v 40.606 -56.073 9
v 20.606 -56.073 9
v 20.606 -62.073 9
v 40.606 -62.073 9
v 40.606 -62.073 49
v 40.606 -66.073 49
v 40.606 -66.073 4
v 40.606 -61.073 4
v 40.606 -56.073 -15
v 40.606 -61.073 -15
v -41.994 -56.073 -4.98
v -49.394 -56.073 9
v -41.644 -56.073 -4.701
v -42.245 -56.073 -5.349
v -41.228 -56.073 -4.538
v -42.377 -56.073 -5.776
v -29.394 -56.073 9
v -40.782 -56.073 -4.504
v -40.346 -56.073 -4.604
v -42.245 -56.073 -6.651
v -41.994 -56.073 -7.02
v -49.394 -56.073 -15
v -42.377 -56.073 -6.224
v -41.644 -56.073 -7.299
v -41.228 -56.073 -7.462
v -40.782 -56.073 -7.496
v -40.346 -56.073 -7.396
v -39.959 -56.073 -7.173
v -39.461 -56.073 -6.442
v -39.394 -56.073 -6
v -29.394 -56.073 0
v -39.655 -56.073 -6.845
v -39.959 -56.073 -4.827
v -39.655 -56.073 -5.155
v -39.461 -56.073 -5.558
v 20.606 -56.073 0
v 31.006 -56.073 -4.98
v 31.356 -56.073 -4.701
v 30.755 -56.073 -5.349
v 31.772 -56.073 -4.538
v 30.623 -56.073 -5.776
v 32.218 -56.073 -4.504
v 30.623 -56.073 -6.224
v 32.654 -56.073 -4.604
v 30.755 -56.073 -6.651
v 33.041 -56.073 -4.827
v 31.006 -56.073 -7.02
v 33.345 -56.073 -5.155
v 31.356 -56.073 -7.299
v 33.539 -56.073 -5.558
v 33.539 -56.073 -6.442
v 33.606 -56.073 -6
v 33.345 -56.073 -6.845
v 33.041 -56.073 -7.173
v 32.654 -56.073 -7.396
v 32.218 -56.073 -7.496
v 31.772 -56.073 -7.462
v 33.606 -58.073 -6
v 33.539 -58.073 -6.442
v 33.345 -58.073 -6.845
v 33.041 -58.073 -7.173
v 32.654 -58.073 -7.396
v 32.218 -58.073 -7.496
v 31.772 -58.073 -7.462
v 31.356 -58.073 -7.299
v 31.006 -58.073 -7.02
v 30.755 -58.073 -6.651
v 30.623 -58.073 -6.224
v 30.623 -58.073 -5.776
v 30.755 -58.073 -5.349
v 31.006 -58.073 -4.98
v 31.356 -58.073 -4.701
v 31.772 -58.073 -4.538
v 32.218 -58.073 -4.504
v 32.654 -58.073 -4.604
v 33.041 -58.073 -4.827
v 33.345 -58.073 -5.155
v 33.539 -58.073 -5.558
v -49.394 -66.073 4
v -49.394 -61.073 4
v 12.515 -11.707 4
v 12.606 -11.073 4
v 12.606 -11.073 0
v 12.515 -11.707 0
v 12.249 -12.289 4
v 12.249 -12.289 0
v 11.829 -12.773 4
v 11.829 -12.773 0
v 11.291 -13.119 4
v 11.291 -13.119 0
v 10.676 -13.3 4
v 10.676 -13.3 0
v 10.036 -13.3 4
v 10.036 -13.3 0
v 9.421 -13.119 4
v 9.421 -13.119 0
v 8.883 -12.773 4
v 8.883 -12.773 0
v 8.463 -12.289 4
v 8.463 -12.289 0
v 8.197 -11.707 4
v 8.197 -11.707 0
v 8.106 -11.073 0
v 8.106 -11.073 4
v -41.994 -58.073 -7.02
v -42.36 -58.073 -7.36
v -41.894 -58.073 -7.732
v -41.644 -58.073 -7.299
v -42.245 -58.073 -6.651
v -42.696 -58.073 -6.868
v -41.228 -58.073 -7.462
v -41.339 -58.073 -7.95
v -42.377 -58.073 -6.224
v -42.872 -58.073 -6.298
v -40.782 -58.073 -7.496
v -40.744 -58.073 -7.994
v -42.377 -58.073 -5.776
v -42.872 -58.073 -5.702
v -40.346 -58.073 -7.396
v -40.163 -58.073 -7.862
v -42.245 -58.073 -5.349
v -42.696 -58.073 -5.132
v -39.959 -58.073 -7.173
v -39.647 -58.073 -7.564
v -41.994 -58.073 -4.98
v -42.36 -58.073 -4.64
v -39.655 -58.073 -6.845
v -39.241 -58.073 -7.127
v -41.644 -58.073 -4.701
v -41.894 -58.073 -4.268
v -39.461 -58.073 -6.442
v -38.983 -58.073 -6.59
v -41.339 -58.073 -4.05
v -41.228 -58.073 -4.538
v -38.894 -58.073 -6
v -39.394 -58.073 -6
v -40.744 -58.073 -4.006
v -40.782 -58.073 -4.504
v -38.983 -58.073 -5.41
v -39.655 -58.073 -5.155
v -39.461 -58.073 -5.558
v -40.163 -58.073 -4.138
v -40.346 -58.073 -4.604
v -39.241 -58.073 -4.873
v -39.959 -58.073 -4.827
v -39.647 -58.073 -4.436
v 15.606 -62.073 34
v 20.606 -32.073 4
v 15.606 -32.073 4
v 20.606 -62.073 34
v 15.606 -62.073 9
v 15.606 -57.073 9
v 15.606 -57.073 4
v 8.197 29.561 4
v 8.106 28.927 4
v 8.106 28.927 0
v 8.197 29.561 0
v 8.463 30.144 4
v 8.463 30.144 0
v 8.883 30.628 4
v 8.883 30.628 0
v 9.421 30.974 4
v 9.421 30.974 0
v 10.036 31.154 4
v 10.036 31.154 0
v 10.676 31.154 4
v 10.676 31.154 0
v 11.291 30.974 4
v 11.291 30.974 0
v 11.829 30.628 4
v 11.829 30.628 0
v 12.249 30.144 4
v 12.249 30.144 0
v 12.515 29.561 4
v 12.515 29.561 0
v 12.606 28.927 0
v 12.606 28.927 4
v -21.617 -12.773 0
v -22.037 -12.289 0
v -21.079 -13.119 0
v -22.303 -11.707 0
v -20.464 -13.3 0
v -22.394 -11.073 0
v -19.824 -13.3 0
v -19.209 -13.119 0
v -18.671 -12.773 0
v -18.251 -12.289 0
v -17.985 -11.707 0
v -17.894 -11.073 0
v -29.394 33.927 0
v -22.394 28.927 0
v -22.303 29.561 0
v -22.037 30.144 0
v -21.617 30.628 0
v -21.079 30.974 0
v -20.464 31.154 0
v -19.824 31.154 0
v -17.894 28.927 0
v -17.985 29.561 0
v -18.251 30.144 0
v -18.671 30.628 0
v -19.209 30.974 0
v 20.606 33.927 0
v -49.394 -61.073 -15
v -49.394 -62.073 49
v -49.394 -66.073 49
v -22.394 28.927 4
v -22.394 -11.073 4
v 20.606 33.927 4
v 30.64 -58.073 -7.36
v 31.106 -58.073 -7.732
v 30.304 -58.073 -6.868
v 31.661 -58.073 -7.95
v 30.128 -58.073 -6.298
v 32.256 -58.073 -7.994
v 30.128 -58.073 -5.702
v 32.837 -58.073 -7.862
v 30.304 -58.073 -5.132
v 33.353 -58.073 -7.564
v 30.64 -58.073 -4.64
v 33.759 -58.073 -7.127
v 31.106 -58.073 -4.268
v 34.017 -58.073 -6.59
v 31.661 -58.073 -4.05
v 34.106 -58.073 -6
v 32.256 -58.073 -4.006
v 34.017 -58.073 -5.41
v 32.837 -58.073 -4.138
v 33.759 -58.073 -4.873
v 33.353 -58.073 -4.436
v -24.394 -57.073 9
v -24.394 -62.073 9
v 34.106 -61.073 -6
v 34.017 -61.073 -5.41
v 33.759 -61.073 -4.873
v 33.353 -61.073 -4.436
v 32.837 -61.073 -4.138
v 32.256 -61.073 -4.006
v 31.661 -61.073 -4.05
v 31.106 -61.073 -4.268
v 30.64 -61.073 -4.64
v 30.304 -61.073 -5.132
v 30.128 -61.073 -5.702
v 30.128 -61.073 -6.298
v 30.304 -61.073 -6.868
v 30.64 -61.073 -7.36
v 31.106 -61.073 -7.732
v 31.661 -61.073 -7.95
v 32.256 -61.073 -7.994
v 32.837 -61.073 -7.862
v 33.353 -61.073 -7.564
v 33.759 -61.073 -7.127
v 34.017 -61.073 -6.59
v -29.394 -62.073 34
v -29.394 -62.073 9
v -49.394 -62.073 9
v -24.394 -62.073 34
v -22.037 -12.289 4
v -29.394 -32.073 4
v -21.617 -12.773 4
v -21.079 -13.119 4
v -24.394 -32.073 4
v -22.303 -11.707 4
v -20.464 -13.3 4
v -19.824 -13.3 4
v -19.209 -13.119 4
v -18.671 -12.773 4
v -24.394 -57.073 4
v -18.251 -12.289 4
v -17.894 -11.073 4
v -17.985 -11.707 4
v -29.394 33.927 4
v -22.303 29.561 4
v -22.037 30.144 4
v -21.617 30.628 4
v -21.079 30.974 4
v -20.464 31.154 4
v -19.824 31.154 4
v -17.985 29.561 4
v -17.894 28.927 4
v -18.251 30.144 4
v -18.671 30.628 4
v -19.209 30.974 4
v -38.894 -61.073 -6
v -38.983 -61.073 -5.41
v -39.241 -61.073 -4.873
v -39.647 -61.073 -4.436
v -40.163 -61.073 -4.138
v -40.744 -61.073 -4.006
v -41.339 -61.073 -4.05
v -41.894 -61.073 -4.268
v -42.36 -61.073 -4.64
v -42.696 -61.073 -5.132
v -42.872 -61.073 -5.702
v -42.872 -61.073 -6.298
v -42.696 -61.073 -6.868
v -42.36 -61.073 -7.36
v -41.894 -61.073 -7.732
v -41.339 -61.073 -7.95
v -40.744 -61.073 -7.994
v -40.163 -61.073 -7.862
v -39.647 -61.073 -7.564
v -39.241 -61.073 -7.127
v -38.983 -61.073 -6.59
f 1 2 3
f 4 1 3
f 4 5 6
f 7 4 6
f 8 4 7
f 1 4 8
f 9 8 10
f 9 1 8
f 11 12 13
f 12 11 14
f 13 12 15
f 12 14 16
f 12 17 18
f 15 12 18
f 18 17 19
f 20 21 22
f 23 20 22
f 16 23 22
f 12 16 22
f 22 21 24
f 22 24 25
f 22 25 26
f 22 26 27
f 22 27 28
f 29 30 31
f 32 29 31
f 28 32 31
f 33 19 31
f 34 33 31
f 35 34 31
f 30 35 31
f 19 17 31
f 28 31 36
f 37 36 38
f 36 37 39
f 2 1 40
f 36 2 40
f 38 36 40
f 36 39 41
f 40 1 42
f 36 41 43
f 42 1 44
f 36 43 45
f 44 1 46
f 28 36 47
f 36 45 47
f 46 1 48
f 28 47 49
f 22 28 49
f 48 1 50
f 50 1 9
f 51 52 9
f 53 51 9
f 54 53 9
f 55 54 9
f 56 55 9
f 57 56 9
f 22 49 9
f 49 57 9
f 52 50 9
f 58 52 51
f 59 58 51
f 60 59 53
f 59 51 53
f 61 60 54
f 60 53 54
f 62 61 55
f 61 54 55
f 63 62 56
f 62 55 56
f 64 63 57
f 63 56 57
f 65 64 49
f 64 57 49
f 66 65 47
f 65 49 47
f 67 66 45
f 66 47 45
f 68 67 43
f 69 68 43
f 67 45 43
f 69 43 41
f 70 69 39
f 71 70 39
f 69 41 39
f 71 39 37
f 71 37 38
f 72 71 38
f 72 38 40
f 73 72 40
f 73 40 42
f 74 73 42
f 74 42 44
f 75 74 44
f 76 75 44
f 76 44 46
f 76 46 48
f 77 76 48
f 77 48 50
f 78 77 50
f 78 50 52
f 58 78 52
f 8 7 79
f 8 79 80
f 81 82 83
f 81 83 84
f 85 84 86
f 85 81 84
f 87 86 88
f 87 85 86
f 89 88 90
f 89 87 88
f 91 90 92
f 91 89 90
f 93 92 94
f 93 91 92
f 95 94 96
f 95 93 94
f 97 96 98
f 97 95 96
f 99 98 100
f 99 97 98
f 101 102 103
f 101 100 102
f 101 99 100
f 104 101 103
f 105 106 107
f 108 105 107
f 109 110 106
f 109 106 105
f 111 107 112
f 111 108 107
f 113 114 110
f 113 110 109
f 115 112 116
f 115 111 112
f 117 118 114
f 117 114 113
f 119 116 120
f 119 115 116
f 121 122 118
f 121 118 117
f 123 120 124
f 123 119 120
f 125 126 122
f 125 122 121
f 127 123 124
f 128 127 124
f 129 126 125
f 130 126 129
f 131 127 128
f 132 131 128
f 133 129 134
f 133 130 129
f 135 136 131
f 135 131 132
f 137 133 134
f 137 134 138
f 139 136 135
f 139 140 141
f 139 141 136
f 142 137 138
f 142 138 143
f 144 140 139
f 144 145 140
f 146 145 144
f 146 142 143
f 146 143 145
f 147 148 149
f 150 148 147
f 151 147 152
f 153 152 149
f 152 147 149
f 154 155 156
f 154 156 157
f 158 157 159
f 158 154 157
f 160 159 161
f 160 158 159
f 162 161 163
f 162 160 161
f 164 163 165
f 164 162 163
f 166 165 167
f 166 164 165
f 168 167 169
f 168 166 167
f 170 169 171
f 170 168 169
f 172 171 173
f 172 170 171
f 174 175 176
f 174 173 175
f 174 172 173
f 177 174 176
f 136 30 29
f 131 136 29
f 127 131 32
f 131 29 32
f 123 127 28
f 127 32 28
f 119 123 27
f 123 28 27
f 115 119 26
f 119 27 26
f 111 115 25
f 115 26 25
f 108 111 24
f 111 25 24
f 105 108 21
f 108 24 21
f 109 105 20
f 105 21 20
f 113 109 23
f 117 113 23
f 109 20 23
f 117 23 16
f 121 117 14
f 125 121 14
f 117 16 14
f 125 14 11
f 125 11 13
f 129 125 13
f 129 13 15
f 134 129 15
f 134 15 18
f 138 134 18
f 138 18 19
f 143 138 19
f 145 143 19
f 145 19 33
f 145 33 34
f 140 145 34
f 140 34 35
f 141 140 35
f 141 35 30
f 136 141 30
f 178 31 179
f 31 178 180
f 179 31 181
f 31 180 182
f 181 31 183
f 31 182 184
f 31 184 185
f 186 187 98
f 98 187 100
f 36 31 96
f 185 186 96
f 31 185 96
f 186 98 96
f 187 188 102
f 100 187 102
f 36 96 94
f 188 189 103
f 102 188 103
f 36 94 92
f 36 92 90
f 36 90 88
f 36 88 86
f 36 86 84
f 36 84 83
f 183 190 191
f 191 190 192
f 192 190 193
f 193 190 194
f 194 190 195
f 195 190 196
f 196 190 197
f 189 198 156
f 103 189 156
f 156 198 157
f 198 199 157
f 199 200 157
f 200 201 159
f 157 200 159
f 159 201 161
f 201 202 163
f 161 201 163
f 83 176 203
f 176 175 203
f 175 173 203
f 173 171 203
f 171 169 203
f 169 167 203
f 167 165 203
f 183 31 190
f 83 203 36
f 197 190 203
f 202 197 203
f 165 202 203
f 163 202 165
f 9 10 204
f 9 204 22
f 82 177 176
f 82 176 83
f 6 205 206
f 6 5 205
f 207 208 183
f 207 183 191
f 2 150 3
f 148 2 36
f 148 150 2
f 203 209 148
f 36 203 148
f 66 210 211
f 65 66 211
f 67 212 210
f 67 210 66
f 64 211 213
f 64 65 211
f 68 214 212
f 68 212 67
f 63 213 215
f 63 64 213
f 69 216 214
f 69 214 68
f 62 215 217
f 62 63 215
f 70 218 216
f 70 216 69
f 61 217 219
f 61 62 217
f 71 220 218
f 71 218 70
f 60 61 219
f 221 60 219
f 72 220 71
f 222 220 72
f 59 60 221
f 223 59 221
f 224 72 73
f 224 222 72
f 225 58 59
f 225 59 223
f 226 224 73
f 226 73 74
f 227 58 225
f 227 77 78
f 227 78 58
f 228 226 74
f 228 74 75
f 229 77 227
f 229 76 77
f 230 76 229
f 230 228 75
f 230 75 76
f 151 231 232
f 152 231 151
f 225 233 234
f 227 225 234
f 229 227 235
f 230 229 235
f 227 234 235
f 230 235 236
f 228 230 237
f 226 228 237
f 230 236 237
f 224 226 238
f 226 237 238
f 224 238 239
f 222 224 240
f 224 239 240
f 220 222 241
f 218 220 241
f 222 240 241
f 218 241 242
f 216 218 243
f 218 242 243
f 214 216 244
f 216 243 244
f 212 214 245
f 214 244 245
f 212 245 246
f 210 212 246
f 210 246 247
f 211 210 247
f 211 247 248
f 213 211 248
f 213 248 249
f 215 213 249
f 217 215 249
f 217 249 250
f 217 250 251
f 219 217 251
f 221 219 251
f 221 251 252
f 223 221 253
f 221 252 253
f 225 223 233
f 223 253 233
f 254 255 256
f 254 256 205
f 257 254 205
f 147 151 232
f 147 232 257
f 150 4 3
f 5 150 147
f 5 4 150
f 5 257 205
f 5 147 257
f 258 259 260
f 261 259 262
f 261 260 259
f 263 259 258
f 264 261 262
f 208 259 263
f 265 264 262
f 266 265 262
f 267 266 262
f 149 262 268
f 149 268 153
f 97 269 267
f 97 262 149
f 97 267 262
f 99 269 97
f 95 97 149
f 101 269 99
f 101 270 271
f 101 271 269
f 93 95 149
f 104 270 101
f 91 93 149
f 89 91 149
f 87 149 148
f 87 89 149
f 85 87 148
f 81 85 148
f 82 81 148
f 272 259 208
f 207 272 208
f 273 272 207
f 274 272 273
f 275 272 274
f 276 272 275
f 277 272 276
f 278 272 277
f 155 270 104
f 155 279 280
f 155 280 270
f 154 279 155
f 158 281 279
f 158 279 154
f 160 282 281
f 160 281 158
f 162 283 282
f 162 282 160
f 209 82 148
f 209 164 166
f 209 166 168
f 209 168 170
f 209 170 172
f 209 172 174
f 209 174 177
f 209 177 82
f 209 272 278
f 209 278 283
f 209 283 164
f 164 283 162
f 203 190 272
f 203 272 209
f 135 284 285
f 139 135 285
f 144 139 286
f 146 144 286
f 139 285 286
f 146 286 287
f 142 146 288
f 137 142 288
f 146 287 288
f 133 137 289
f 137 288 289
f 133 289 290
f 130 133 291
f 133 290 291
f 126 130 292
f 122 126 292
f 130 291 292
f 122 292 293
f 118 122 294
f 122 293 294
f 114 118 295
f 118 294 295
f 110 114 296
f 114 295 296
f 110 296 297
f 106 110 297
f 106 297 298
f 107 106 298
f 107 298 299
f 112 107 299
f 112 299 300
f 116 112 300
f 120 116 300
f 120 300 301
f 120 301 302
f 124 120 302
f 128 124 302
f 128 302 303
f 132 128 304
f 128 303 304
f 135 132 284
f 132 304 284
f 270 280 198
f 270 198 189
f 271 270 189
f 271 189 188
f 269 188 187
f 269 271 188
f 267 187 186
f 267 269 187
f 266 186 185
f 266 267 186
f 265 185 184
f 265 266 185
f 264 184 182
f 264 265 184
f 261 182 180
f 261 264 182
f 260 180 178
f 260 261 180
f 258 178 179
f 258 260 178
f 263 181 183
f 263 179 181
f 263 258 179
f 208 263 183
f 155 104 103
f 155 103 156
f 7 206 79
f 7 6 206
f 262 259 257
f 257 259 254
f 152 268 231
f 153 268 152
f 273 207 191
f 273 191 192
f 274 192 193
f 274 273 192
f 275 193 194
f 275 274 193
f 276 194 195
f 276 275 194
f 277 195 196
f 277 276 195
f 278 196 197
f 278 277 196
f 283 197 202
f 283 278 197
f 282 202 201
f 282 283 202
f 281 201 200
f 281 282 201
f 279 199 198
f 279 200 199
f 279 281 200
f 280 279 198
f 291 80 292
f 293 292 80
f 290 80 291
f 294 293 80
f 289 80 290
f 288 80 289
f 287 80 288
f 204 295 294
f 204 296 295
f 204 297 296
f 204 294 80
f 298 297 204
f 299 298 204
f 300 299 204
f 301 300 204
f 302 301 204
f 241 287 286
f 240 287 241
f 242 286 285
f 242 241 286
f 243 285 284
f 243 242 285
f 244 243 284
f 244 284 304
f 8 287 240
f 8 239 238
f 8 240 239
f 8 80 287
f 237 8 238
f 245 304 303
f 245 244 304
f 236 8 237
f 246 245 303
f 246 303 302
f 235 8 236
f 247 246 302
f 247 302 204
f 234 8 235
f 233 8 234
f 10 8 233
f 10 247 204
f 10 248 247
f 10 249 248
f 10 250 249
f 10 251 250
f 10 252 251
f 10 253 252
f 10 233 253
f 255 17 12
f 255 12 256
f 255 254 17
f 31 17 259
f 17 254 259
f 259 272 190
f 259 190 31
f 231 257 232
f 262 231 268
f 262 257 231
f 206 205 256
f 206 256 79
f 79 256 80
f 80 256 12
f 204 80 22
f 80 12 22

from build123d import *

# Parameters (mm, degrees)
ESQUISSE1_W             = 50
ESQUISSE1_H             = 95
BOSS_EXTRU_1_DEPTH      = 4
ESQUISSE2_W             = 50
ESQUISSE2_H             = 4
BOSS_EXTRU_2_DEPTH      = 5
ESQUISSE3_W             = 50
ESQUISSE3_H             = 5
BOSS_EXTRU_3_DEPTH      = 5
ESQUISSE4_W             = 50
ESQUISSE4_H             = 4
BOSS_EXTRU_4_DEPTH      = 40
ESQUISSE5_W             = 50
ESQUISSE5_H             = 5
BOSS_EXTRU_5_DEPTH      = 15
ENL_V_MAT_EXTRU_1_REACH = 21
BOSS_EXTRU_6_DEPTH      = 5
BOSS_EXTRU_7_DEPTH      = 5
BOSS_EXTRU_8_DEPTH      = 20
BOSS_EXTRU_9_DEPTH      = 20
ENL_V_MAT_EXTRU_2_REACH = 12
ESQUISSE12_R            = 1.5
ESQUISSE13_R            = 2
ENL_V_MAT_EXTRU_3_DEPTH = 3


with BuildPart() as part:
    # Esquisse1 → Boss.-Extru.1 (new body)
    with BuildSketch(Plane.XY):
        with Locations((-4.39396009, -13.572795505)):
            Rectangle(ESQUISSE1_W, ESQUISSE1_H)
    extrude(amount=BOSS_EXTRU_1_DEPTH)

    # Esquisse2 → Boss.-Extru.2 (add)
    with BuildSketch(Plane.XY.offset(4)):
        with Locations((-4.39396009, -59.072795505)):
            Rectangle(ESQUISSE2_W, ESQUISSE2_H)
    extrude(amount=BOSS_EXTRU_2_DEPTH)

    # Esquisse3 → Boss.-Extru.3 (add)
    with BuildSketch(Plane.XZ.offset(61.072795505)):
        with Locations((-4.39396009, 6.5)):
            Rectangle(ESQUISSE3_W, ESQUISSE3_H)
    extrude(amount=BOSS_EXTRU_3_DEPTH)

    # Esquisse4 → Boss.-Extru.4 (add)
    with BuildSketch(Plane.XY.offset(9)):
        with Locations((-4.39396009, -64.072795505)):
            Rectangle(ESQUISSE4_W, ESQUISSE4_H)
    extrude(amount=BOSS_EXTRU_4_DEPTH)

    # Esquisse5 → Boss.-Extru.5 (add)
    with BuildSketch(Plane(origin=(0, 0, 0), x_dir=(-1, 0, 0), z_dir=(0, 0, -1))):
        with Locations((4.39396009, -58.572795505)):
            Rectangle(ESQUISSE5_W, ESQUISSE5_H)
    extrude(amount=BOSS_EXTRU_5_DEPTH)

    # Esquisse6 → Enlèv. mat.-Extru.1 (cut, up to next)
    with BuildSketch(Plane.XY.offset(4), mode=Mode.PRIVATE) as enl_v_mat_extru_1_sk1:
        with BuildLine():
            Line((-17.89396009, 28.927204495), (-17.89396009, -11.072795505))
            ThreePointArc((-17.89396009, -11.072795505), (-20.14396009, -13.322795505), (-22.39396009, -11.072795505))
            Line((-22.39396009, -11.072795505), (-22.39396009, 28.927204495))
            ThreePointArc((-22.39396009, 28.927204495), (-20.14396009, 31.177204495), (-17.89396009, 28.927204495))
        make_face()
    enl_v_mat_extru_1_tool1 = extrude(enl_v_mat_extru_1_sk1.sketch, amount=-ENL_V_MAT_EXTRU_1_REACH, mode=Mode.PRIVATE) & part.part
    add(enl_v_mat_extru_1_tool1.solids().sort_by_distance((-20.14396, 8.927204, 4))[0], mode=Mode.SUBTRACT)
    # Esquisse6 → Enlèv. mat.-Extru.1 (cut, up to next)
    with BuildSketch(Plane.XY.offset(4), mode=Mode.PRIVATE) as enl_v_mat_extru_1_sk2:
        with BuildLine():
            Line((12.60603991, 28.927204495), (12.60603991, -11.072795505))
            ThreePointArc((12.60603991, -11.072795505), (10.35603991, -13.322795505), (8.10603991, -11.072795505))
            Line((8.10603991, -11.072795505), (8.10603991, 28.927204495))
            ThreePointArc((8.10603991, 28.927204495), (10.35603991, 31.177204495), (12.60603991, 28.927204495))
        make_face()
    enl_v_mat_extru_1_tool2 = extrude(enl_v_mat_extru_1_sk2.sketch, amount=-ENL_V_MAT_EXTRU_1_REACH, mode=Mode.PRIVATE) & part.part
    add(enl_v_mat_extru_1_tool2.solids().sort_by_distance((10.35604, 8.927204, 4))[0], mode=Mode.SUBTRACT)

    # Esquisse7 → Boss.-Extru.6 (add)
    with BuildSketch(Plane.ZY.offset(29.39396009)):
        Polygon((4, -32.072795505), (34, -62.072795505), (4, -62.072795505), align=None)
    extrude(amount=-BOSS_EXTRU_6_DEPTH)

    # Esquisse8 → Boss.-Extru.7 (add)
    with BuildSketch(Plane(origin=(20.60603991, 0, 0), x_dir=(0, 0, -1), z_dir=(1, 0, 0))):
        Polygon((-4, -32.072795505), (-34, -62.072795505), (-4, -62.072795505), align=None)
    extrude(amount=-BOSS_EXTRU_7_DEPTH)

    # Esquisse10 → Boss.-Extru.8 (add)
    with BuildSketch(Plane(origin=(20.60603991, 0, 0), x_dir=(0, 0, -1), z_dir=(1, 0, 0))):
        Polygon((-49, -62.072795505), (-49, -66.072795505), (-4, -66.072795505), (-4, -61.072795505), (15, -61.072795505), (15, -56.072795505), (0, -56.072795505), (-9, -56.072795505), (-9, -62.072795505), align=None)
    extrude(amount=BOSS_EXTRU_8_DEPTH)

    # Esquisse11 → Boss.-Extru.9 (add)
    with BuildSketch(Plane.ZY.offset(29.39396009)):
        Polygon((49, -66.072795505), (4, -66.072795505), (4, -61.072795505), (-15, -61.072795505), (-15, -56.072795505), (0, -56.072795505), (9, -56.072795505), (9, -62.072795505), (49, -62.072795505), align=None)
    extrude(amount=BOSS_EXTRU_9_DEPTH)

    # Esquisse12 → Enlèv. mat.-Extru.2 (cut, up to next)
    with BuildSketch(Plane(origin=(0, -56.072795505, 0), x_dir=(1, 0, 0), z_dir=(0, 1, 0)), mode=Mode.PRIVATE) as enl_v_mat_extru_2_sk1:
        with Locations((32.10603991, 6)):
            Circle(ESQUISSE12_R)
    enl_v_mat_extru_2_tool1 = extrude(enl_v_mat_extru_2_sk1.sketch, amount=-ENL_V_MAT_EXTRU_2_REACH, mode=Mode.PRIVATE) & part.part
    add(enl_v_mat_extru_2_tool1.solids().sort_by_distance((32.10604, -56.072796, -6))[0], mode=Mode.SUBTRACT)
    # Esquisse12 → Enlèv. mat.-Extru.2 (cut, up to next)
    with BuildSketch(Plane(origin=(0, -56.072795505, 0), x_dir=(1, 0, 0), z_dir=(0, 1, 0)), mode=Mode.PRIVATE) as enl_v_mat_extru_2_sk2:
        with Locations((-40.89396009, 6)):
            Circle(ESQUISSE12_R)
    enl_v_mat_extru_2_tool2 = extrude(enl_v_mat_extru_2_sk2.sketch, amount=-ENL_V_MAT_EXTRU_2_REACH, mode=Mode.PRIVATE) & part.part
    add(enl_v_mat_extru_2_tool2.solids().sort_by_distance((-40.89396, -56.072796, -6))[0], mode=Mode.SUBTRACT)

    # Esquisse13 → Enlèv. mat.-Extru.3 (cut)
    with BuildSketch(Plane.XZ.offset(61.072795505)):
        with Locations((32.10603991, -6)):
            Circle(ESQUISSE13_R)
        with Locations((-40.89396009, -6)):
            Circle(ESQUISSE13_R)
    extrude(amount=-ENL_V_MAT_EXTRU_3_DEPTH, mode=Mode.SUBTRACT)


solid = part.part
